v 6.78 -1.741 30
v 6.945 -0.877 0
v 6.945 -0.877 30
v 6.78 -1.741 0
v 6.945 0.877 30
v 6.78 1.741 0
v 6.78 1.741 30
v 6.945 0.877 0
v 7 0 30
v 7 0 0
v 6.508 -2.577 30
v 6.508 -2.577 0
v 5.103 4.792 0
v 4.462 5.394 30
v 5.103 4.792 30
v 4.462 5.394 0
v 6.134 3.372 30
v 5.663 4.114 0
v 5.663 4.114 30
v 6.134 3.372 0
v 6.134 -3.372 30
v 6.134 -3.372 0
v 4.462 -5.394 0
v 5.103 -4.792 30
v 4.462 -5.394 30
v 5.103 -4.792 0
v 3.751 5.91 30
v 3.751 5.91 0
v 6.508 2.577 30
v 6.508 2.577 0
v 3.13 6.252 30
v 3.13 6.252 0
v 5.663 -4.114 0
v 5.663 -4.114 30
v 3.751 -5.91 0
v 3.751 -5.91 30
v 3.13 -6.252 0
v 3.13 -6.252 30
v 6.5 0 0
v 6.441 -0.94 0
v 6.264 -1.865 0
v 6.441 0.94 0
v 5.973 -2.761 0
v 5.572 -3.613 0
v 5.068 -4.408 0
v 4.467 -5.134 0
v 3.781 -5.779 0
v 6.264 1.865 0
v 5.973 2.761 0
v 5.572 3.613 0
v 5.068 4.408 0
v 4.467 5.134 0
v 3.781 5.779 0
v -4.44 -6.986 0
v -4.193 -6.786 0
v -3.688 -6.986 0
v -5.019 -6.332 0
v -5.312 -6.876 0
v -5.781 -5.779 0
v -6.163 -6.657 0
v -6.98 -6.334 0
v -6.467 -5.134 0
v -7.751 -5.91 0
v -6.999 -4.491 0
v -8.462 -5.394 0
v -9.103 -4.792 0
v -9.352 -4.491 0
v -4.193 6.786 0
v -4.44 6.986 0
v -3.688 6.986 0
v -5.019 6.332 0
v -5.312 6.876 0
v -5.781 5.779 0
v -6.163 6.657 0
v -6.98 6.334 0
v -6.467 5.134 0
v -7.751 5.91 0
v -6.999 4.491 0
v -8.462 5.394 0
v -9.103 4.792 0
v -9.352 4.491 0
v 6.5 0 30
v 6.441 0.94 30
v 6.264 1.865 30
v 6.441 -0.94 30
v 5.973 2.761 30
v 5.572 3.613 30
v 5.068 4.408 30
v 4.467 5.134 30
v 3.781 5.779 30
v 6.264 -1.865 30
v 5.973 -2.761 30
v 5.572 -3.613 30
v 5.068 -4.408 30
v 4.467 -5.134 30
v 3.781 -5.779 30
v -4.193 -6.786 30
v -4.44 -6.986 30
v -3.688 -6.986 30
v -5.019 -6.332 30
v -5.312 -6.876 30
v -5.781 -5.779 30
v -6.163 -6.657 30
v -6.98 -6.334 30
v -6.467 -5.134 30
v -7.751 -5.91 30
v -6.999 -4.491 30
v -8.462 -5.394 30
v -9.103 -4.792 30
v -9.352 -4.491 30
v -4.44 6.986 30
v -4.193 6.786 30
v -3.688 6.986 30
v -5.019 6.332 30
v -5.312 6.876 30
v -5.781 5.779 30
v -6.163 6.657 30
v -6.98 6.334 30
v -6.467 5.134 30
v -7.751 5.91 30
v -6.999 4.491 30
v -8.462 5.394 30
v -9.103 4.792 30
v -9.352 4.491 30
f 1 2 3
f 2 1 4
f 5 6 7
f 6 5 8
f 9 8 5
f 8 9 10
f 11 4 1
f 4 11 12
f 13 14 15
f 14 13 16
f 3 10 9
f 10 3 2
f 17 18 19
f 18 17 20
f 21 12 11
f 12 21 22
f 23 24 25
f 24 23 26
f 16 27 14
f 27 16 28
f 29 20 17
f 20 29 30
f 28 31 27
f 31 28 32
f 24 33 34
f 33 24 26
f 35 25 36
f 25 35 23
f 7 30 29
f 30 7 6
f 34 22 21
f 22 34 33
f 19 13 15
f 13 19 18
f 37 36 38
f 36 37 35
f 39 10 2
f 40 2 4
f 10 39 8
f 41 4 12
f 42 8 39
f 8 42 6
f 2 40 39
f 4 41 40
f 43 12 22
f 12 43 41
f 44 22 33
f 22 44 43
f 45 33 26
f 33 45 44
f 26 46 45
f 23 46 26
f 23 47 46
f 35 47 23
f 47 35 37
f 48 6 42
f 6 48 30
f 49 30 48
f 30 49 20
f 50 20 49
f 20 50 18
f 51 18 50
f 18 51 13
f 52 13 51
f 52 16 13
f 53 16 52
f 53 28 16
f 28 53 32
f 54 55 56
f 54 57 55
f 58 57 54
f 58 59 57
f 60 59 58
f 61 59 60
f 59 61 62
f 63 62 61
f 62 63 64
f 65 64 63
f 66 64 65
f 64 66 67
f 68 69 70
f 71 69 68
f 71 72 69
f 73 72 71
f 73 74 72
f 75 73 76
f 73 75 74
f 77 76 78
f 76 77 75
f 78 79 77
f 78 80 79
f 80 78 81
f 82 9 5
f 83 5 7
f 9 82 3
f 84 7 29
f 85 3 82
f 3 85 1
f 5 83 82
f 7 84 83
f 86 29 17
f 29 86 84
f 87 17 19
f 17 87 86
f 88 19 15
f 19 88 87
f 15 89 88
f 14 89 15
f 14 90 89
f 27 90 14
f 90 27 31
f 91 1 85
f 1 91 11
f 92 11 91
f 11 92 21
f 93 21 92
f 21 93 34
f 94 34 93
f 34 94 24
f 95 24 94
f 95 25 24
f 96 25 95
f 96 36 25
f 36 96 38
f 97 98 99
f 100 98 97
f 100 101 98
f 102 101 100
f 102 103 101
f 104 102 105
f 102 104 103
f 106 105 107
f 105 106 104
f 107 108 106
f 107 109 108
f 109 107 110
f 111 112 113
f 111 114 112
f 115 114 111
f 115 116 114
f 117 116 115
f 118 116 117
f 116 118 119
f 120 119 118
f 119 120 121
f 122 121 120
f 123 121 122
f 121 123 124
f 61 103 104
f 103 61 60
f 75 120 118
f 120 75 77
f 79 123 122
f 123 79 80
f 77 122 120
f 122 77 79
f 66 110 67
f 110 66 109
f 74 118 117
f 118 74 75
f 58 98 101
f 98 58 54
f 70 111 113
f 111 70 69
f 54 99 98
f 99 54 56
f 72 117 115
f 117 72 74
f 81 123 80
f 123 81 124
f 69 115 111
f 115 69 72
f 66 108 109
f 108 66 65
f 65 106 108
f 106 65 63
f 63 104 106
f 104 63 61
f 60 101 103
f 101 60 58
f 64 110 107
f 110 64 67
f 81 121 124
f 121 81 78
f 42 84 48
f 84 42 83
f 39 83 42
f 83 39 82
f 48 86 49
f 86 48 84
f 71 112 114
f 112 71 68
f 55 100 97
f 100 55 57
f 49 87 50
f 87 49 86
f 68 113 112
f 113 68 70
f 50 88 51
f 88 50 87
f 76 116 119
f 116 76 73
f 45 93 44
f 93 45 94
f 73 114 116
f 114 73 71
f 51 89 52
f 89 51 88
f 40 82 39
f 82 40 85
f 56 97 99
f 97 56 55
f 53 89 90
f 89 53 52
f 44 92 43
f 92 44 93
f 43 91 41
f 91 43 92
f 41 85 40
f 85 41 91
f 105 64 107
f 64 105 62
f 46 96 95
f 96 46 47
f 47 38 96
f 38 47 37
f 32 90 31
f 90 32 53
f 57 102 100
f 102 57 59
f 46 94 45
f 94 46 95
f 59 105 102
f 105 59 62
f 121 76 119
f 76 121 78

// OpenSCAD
$fn = 50;


difference() {
	union() {
		cylinder(h = 30, r = 7.0000000000);
		translate(v = [-4.0000000000, 0, 0]) {
			cylinder(h = 30, r = 7.0000000000);
		}
	}
	union() {
		cylinder(h = 30, r = 3.2500000000);
		cylinder(h = 30, r = 1.8000000000);
		cylinder(h = 30, r = 1.8000000000);
		cylinder(h = 30, r = 1.8000000000);
		translate(v = [-8.5000000000, 0, 0]) {
			hull() {
				translate(v = [-3.7500000000, 0.0000000000, 0]) {
					cylinder(h = 30, r = 4.5000000000);
				}
				translate(v = [3.7500000000, 0.0000000000, 0]) {
					cylinder(h = 30, r = 4.5000000000);
				}
				translate(v = [-3.7500000000, -0.0000000000, 0]) {
					cylinder(h = 30, r = 4.5000000000);
				}
				translate(v = [3.7500000000, -0.0000000000, 0]) {
					cylinder(h = 30, r = 4.5000000000);
				}
			}
		}
		translate(v = [-1.0000000000, 0, 0.0000000000]) {
			cylinder(h = 30, r = 7.5000000000);
		}
	}
}
